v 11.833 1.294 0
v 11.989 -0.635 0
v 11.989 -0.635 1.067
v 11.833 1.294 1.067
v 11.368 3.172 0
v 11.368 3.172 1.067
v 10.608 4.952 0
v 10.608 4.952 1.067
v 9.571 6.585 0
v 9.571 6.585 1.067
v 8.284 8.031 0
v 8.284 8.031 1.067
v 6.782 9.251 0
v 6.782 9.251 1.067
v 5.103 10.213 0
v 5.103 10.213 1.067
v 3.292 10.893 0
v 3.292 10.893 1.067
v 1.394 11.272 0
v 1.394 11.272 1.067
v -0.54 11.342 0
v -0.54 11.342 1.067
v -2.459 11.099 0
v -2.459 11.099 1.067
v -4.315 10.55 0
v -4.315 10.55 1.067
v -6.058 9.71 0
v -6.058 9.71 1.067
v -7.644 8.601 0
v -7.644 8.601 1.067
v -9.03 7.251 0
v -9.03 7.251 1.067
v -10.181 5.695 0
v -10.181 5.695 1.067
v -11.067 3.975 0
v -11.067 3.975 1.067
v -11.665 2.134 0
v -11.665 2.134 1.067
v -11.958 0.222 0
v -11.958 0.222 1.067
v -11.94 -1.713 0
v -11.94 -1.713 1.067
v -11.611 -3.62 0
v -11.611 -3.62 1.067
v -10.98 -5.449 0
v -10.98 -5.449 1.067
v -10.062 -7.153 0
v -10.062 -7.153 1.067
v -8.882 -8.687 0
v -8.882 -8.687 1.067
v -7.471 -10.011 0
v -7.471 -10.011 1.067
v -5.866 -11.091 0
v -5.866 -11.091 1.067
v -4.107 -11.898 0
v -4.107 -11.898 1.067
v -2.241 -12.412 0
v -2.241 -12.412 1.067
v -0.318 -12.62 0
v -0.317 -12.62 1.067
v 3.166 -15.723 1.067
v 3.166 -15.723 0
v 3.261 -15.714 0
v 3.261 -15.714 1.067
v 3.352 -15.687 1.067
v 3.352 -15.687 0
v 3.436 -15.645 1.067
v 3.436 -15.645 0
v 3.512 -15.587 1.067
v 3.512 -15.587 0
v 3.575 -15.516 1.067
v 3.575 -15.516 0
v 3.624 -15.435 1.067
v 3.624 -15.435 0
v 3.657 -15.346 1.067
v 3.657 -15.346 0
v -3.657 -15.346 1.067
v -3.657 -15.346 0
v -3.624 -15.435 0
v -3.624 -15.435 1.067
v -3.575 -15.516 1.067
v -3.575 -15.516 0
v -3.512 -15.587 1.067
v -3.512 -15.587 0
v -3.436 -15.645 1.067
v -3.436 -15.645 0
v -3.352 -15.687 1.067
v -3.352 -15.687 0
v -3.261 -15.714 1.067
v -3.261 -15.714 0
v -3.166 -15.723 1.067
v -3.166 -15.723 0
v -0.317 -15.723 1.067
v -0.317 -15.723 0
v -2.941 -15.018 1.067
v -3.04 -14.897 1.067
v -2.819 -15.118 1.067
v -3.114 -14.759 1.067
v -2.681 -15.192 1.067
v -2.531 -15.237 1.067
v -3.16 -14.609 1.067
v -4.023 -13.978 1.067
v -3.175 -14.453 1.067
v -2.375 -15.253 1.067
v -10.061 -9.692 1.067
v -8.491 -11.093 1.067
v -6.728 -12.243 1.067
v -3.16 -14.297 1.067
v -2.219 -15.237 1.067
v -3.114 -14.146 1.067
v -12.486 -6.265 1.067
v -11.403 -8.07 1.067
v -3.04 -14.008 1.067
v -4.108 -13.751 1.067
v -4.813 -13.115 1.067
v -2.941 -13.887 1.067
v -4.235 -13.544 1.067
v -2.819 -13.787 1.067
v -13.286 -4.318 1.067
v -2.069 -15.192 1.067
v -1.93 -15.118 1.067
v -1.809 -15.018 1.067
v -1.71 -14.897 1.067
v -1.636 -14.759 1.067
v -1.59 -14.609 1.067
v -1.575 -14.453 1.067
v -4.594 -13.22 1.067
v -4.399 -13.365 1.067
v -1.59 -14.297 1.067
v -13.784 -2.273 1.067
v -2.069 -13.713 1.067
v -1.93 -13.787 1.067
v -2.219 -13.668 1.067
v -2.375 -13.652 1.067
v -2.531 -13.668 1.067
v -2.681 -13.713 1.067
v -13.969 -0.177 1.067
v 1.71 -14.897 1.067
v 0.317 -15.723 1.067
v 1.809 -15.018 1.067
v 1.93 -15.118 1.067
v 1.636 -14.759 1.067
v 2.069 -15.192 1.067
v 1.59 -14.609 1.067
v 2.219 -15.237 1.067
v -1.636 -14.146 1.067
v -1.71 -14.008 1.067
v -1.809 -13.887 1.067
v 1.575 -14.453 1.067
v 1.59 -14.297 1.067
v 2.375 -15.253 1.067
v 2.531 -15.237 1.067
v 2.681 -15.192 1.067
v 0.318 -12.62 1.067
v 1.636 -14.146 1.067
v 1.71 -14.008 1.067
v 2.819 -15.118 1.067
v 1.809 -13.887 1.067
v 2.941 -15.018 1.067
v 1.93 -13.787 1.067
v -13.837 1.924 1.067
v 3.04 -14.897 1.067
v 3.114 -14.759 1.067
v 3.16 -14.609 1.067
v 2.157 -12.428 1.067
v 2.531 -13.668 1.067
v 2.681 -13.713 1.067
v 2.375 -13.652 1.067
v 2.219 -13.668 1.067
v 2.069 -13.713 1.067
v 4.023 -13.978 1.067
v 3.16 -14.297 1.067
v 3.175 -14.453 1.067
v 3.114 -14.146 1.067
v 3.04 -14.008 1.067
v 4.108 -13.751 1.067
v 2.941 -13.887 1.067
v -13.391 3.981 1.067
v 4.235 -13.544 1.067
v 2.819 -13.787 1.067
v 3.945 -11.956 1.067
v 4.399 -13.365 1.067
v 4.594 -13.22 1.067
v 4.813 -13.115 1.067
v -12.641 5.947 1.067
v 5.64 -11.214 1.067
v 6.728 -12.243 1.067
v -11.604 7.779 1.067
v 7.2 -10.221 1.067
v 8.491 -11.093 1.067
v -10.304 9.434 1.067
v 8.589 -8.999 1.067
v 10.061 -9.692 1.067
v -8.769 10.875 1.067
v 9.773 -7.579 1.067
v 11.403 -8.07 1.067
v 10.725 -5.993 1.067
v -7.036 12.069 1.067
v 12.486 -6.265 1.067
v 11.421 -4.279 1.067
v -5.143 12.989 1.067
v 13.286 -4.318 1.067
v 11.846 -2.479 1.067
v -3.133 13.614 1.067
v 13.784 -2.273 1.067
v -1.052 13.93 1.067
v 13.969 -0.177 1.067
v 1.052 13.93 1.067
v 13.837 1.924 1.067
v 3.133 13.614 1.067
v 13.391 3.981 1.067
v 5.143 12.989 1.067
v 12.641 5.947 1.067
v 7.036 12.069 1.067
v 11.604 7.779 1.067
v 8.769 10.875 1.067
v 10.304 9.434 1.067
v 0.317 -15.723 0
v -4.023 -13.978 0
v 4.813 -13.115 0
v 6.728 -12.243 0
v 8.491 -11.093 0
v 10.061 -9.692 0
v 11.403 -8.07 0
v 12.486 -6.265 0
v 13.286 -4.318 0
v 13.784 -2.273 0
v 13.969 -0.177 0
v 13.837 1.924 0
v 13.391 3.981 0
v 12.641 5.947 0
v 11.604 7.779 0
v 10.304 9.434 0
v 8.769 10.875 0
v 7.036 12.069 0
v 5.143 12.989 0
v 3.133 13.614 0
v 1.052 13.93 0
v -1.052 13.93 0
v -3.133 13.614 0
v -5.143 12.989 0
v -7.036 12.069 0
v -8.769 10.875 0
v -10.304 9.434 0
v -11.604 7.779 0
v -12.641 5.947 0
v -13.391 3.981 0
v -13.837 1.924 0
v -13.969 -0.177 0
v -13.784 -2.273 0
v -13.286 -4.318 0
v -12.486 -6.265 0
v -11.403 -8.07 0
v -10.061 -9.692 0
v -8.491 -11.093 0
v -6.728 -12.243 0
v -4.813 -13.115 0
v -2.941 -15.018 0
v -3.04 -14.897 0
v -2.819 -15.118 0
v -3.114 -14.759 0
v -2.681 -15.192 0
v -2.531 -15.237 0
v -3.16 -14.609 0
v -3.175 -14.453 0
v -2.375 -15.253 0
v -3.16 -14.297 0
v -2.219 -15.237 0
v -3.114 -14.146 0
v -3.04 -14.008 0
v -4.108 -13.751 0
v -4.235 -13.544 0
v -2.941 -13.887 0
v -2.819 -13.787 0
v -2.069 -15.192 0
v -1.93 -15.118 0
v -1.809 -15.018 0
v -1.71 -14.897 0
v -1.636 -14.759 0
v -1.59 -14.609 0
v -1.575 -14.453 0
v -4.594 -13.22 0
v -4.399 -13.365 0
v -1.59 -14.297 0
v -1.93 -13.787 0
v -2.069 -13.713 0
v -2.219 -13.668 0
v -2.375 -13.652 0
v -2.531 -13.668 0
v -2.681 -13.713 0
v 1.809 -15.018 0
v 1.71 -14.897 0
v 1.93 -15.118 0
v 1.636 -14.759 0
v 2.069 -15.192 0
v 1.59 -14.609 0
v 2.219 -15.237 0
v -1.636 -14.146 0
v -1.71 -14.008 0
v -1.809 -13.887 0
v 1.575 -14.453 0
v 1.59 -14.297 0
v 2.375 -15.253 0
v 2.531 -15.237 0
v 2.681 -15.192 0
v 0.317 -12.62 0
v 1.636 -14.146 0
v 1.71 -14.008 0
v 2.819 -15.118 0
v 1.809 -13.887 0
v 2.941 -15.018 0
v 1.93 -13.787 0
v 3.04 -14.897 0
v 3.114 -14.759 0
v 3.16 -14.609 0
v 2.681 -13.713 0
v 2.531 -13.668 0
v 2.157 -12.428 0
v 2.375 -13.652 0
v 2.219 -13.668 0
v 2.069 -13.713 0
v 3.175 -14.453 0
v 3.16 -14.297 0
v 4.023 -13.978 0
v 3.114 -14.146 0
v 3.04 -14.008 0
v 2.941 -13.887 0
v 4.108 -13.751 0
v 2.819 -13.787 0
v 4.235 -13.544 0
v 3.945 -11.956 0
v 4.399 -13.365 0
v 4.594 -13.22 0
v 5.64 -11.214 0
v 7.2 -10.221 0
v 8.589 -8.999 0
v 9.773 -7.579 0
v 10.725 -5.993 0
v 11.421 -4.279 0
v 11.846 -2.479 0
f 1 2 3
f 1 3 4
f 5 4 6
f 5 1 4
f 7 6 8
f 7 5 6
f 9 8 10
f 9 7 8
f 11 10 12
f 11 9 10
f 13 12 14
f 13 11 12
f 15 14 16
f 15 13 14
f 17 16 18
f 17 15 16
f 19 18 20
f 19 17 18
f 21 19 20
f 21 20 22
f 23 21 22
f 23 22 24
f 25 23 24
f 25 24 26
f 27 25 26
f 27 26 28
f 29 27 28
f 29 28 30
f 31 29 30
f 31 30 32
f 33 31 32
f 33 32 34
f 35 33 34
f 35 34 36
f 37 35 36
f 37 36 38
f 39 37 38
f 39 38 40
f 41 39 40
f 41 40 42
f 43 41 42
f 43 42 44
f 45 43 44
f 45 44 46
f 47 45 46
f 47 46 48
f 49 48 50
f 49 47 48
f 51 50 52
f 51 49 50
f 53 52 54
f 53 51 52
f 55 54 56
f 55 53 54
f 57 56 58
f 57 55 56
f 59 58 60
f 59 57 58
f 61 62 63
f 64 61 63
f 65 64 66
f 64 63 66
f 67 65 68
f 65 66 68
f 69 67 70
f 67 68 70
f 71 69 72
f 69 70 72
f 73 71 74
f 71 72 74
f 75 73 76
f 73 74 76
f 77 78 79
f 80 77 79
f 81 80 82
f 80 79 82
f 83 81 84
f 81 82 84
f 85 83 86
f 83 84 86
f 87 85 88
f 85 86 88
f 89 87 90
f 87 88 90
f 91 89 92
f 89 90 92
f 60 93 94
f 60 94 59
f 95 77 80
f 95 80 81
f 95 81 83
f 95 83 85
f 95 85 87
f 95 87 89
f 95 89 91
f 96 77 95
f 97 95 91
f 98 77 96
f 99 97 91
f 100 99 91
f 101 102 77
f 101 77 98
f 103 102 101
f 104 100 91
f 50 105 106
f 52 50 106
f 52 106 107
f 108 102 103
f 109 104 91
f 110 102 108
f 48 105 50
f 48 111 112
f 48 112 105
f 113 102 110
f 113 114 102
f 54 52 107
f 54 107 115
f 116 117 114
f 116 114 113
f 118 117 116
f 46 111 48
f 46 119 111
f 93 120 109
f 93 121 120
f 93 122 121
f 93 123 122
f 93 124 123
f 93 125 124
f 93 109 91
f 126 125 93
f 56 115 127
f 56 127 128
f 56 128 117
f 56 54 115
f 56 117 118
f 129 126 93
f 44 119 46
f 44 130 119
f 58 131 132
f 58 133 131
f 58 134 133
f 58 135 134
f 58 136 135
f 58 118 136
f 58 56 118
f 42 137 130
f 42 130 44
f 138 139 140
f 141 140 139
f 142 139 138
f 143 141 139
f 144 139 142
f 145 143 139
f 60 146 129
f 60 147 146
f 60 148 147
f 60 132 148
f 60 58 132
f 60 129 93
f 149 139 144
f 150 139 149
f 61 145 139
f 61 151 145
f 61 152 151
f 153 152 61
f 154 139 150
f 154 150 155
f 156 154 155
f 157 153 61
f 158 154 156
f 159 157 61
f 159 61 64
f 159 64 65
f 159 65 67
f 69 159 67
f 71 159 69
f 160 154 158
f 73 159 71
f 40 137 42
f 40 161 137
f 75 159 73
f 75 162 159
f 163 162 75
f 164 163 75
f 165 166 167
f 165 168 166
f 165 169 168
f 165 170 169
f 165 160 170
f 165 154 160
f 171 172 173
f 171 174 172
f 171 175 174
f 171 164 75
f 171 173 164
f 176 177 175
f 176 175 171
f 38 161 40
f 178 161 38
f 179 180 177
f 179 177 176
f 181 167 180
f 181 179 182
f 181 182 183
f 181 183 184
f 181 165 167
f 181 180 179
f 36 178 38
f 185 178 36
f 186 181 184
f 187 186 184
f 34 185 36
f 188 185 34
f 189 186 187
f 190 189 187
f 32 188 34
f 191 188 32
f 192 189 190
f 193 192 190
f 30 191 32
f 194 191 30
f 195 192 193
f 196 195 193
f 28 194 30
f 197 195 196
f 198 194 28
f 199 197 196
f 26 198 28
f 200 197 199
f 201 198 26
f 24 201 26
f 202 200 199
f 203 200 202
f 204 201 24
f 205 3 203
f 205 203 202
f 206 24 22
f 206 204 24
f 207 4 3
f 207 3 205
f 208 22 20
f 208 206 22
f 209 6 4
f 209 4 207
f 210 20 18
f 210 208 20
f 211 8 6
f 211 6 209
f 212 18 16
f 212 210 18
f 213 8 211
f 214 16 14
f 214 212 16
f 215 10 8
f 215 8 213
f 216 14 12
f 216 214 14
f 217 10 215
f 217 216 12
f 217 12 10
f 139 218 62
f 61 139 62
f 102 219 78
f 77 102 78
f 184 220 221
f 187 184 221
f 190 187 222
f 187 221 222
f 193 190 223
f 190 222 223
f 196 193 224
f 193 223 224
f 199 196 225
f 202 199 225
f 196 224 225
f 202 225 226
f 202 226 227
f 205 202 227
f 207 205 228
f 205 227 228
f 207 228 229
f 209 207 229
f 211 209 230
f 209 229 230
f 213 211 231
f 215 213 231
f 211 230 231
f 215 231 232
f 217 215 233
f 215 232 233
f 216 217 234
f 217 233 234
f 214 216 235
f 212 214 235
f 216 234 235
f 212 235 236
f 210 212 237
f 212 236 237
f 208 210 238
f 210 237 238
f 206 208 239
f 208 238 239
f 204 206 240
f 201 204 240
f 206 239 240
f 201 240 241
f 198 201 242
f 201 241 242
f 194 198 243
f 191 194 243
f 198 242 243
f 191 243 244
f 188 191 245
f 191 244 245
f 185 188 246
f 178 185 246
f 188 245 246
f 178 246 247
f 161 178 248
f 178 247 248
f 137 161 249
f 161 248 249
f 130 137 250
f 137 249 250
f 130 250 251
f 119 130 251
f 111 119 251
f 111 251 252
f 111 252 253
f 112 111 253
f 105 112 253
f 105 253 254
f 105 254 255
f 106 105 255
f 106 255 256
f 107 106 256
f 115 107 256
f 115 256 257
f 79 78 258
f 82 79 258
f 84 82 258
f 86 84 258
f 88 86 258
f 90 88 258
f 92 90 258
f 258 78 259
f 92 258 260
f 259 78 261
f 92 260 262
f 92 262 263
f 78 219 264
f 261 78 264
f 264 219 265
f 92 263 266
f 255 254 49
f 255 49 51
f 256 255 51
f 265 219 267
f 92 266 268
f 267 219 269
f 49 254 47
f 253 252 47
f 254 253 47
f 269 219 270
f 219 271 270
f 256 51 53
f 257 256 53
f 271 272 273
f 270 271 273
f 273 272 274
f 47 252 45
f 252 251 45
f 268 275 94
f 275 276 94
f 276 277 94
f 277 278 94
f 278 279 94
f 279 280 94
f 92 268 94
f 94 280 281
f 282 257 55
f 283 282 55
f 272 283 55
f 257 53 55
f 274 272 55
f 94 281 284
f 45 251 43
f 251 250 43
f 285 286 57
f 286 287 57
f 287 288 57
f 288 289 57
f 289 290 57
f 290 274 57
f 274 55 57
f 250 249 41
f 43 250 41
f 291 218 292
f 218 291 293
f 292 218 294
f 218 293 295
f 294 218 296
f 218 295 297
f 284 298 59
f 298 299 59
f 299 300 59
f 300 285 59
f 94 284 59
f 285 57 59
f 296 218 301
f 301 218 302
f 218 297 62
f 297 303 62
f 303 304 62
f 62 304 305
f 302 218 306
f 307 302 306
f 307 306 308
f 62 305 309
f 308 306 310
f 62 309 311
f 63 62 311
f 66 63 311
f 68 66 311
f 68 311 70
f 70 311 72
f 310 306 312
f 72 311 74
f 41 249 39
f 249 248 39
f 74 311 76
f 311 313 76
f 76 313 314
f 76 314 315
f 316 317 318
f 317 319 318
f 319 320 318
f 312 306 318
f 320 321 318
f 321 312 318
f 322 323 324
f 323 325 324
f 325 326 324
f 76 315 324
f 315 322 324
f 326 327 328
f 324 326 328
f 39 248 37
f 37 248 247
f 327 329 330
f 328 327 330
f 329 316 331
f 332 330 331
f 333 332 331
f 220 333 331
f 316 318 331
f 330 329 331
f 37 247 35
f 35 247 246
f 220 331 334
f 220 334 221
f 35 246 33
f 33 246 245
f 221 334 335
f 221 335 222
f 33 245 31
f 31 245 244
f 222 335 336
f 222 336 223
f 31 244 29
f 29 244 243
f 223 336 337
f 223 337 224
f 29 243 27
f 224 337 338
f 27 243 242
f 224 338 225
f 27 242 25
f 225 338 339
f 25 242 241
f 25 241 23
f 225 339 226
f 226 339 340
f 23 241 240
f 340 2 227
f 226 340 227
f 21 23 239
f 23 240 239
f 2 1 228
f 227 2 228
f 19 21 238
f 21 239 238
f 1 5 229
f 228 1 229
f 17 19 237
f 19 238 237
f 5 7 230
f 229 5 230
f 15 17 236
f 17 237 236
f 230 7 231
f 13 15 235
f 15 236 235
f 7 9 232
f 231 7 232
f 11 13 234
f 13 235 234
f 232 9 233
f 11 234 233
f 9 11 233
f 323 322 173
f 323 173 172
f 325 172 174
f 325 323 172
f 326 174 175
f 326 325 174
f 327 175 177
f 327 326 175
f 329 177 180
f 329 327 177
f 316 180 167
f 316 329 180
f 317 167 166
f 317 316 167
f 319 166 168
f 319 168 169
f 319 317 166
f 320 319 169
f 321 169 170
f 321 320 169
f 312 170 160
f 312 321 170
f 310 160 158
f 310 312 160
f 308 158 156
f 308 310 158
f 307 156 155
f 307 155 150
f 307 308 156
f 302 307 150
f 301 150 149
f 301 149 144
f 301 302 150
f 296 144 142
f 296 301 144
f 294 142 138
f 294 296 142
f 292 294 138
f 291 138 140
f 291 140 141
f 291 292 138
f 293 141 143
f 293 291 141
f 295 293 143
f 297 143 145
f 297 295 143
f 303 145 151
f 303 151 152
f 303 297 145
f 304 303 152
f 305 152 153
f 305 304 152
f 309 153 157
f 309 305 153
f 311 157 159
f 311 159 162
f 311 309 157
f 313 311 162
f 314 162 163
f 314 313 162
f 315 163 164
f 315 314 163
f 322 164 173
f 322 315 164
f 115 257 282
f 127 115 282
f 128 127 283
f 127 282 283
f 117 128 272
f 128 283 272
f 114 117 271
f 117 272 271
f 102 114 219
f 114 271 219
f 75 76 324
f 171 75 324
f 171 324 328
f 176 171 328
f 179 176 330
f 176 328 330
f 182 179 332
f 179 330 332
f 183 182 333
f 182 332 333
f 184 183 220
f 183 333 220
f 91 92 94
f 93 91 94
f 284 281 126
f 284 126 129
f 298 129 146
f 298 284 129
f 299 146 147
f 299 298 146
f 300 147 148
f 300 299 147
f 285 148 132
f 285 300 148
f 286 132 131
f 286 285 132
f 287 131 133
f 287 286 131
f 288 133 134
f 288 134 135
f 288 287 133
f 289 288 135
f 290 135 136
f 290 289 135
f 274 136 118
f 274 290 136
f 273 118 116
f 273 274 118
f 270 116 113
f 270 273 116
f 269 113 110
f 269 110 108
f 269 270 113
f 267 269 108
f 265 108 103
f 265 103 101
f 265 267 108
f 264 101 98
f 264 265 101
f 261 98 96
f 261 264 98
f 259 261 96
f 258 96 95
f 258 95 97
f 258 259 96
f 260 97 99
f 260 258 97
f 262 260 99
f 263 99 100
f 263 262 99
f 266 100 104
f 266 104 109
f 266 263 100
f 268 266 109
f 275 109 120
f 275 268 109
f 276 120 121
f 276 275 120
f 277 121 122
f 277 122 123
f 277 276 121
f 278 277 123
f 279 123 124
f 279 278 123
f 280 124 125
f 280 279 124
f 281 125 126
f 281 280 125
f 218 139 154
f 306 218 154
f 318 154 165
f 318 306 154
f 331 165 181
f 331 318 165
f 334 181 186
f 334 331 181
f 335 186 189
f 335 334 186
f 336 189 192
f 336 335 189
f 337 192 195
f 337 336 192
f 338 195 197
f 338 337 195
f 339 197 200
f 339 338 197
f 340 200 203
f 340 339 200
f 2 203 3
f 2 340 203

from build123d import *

# Parameters (mm, degrees)
BASE_SKETCH_R    = 11.9888
BASE_SKETCH_R_2  = 0.8001
BASE_DEPTH       = 1.0668
CUT_SKETCH_W     = 0.635
CUT_SKETCH_H     = 7.458306792
BOTTOM_CUT_DEPTH = 22.059418629


with BuildPart() as part:
    # Base Sketch → Base (new body)
    with BuildSketch(Plane.XY):
        with BuildLine():
            Line((-3.16619789, -15.7226), (3.16619789, -15.7226))
            ThreePointArc((3.16619789, -15.7226), (3.475448696, -15.617623497), (3.65688821, -15.346080075))
            Line((3.65688821, -15.346080075), (4.023345402, -13.978443217))
            ThreePointArc((4.023345402, -13.978443217), (4.312600377, -13.450377126), (4.812565268, -13.114881454))
            ThreePointArc((4.812565268, -13.114881454), (0, 13.97), (-4.812565268, -13.114881454))
            ThreePointArc((-4.812565268, -13.114881454), (-4.312600377, -13.450377126), (-4.023345402, -13.978443217))
            Line((-4.023345402, -13.978443217), (-3.65688821, -15.346080075))
            ThreePointArc((-3.65688821, -15.346080075), (-3.475448696, -15.617623497), (-3.16619789, -15.7226))
        make_face()
        with Locations((0, -0.635)):
            Circle(BASE_SKETCH_R, mode=Mode.SUBTRACT)
        with Locations((2.3749, -14.4526)):
            Circle(BASE_SKETCH_R_2, mode=Mode.SUBTRACT)
        with Locations((-2.3749, -14.4526)):
            Circle(BASE_SKETCH_R_2, mode=Mode.SUBTRACT)
    extrude(amount=BASE_DEPTH)

    # Cut Sketch → Bottom Cut (cut, through all)
    with BuildSketch(Plane.XY.offset(1.0668)):
        with Locations((0, -12.6238)):
            Rectangle(CUT_SKETCH_W, CUT_SKETCH_H)
    extrude(amount=-BOTTOM_CUT_DEPTH, mode=Mode.SUBTRACT)


solid = part.part
